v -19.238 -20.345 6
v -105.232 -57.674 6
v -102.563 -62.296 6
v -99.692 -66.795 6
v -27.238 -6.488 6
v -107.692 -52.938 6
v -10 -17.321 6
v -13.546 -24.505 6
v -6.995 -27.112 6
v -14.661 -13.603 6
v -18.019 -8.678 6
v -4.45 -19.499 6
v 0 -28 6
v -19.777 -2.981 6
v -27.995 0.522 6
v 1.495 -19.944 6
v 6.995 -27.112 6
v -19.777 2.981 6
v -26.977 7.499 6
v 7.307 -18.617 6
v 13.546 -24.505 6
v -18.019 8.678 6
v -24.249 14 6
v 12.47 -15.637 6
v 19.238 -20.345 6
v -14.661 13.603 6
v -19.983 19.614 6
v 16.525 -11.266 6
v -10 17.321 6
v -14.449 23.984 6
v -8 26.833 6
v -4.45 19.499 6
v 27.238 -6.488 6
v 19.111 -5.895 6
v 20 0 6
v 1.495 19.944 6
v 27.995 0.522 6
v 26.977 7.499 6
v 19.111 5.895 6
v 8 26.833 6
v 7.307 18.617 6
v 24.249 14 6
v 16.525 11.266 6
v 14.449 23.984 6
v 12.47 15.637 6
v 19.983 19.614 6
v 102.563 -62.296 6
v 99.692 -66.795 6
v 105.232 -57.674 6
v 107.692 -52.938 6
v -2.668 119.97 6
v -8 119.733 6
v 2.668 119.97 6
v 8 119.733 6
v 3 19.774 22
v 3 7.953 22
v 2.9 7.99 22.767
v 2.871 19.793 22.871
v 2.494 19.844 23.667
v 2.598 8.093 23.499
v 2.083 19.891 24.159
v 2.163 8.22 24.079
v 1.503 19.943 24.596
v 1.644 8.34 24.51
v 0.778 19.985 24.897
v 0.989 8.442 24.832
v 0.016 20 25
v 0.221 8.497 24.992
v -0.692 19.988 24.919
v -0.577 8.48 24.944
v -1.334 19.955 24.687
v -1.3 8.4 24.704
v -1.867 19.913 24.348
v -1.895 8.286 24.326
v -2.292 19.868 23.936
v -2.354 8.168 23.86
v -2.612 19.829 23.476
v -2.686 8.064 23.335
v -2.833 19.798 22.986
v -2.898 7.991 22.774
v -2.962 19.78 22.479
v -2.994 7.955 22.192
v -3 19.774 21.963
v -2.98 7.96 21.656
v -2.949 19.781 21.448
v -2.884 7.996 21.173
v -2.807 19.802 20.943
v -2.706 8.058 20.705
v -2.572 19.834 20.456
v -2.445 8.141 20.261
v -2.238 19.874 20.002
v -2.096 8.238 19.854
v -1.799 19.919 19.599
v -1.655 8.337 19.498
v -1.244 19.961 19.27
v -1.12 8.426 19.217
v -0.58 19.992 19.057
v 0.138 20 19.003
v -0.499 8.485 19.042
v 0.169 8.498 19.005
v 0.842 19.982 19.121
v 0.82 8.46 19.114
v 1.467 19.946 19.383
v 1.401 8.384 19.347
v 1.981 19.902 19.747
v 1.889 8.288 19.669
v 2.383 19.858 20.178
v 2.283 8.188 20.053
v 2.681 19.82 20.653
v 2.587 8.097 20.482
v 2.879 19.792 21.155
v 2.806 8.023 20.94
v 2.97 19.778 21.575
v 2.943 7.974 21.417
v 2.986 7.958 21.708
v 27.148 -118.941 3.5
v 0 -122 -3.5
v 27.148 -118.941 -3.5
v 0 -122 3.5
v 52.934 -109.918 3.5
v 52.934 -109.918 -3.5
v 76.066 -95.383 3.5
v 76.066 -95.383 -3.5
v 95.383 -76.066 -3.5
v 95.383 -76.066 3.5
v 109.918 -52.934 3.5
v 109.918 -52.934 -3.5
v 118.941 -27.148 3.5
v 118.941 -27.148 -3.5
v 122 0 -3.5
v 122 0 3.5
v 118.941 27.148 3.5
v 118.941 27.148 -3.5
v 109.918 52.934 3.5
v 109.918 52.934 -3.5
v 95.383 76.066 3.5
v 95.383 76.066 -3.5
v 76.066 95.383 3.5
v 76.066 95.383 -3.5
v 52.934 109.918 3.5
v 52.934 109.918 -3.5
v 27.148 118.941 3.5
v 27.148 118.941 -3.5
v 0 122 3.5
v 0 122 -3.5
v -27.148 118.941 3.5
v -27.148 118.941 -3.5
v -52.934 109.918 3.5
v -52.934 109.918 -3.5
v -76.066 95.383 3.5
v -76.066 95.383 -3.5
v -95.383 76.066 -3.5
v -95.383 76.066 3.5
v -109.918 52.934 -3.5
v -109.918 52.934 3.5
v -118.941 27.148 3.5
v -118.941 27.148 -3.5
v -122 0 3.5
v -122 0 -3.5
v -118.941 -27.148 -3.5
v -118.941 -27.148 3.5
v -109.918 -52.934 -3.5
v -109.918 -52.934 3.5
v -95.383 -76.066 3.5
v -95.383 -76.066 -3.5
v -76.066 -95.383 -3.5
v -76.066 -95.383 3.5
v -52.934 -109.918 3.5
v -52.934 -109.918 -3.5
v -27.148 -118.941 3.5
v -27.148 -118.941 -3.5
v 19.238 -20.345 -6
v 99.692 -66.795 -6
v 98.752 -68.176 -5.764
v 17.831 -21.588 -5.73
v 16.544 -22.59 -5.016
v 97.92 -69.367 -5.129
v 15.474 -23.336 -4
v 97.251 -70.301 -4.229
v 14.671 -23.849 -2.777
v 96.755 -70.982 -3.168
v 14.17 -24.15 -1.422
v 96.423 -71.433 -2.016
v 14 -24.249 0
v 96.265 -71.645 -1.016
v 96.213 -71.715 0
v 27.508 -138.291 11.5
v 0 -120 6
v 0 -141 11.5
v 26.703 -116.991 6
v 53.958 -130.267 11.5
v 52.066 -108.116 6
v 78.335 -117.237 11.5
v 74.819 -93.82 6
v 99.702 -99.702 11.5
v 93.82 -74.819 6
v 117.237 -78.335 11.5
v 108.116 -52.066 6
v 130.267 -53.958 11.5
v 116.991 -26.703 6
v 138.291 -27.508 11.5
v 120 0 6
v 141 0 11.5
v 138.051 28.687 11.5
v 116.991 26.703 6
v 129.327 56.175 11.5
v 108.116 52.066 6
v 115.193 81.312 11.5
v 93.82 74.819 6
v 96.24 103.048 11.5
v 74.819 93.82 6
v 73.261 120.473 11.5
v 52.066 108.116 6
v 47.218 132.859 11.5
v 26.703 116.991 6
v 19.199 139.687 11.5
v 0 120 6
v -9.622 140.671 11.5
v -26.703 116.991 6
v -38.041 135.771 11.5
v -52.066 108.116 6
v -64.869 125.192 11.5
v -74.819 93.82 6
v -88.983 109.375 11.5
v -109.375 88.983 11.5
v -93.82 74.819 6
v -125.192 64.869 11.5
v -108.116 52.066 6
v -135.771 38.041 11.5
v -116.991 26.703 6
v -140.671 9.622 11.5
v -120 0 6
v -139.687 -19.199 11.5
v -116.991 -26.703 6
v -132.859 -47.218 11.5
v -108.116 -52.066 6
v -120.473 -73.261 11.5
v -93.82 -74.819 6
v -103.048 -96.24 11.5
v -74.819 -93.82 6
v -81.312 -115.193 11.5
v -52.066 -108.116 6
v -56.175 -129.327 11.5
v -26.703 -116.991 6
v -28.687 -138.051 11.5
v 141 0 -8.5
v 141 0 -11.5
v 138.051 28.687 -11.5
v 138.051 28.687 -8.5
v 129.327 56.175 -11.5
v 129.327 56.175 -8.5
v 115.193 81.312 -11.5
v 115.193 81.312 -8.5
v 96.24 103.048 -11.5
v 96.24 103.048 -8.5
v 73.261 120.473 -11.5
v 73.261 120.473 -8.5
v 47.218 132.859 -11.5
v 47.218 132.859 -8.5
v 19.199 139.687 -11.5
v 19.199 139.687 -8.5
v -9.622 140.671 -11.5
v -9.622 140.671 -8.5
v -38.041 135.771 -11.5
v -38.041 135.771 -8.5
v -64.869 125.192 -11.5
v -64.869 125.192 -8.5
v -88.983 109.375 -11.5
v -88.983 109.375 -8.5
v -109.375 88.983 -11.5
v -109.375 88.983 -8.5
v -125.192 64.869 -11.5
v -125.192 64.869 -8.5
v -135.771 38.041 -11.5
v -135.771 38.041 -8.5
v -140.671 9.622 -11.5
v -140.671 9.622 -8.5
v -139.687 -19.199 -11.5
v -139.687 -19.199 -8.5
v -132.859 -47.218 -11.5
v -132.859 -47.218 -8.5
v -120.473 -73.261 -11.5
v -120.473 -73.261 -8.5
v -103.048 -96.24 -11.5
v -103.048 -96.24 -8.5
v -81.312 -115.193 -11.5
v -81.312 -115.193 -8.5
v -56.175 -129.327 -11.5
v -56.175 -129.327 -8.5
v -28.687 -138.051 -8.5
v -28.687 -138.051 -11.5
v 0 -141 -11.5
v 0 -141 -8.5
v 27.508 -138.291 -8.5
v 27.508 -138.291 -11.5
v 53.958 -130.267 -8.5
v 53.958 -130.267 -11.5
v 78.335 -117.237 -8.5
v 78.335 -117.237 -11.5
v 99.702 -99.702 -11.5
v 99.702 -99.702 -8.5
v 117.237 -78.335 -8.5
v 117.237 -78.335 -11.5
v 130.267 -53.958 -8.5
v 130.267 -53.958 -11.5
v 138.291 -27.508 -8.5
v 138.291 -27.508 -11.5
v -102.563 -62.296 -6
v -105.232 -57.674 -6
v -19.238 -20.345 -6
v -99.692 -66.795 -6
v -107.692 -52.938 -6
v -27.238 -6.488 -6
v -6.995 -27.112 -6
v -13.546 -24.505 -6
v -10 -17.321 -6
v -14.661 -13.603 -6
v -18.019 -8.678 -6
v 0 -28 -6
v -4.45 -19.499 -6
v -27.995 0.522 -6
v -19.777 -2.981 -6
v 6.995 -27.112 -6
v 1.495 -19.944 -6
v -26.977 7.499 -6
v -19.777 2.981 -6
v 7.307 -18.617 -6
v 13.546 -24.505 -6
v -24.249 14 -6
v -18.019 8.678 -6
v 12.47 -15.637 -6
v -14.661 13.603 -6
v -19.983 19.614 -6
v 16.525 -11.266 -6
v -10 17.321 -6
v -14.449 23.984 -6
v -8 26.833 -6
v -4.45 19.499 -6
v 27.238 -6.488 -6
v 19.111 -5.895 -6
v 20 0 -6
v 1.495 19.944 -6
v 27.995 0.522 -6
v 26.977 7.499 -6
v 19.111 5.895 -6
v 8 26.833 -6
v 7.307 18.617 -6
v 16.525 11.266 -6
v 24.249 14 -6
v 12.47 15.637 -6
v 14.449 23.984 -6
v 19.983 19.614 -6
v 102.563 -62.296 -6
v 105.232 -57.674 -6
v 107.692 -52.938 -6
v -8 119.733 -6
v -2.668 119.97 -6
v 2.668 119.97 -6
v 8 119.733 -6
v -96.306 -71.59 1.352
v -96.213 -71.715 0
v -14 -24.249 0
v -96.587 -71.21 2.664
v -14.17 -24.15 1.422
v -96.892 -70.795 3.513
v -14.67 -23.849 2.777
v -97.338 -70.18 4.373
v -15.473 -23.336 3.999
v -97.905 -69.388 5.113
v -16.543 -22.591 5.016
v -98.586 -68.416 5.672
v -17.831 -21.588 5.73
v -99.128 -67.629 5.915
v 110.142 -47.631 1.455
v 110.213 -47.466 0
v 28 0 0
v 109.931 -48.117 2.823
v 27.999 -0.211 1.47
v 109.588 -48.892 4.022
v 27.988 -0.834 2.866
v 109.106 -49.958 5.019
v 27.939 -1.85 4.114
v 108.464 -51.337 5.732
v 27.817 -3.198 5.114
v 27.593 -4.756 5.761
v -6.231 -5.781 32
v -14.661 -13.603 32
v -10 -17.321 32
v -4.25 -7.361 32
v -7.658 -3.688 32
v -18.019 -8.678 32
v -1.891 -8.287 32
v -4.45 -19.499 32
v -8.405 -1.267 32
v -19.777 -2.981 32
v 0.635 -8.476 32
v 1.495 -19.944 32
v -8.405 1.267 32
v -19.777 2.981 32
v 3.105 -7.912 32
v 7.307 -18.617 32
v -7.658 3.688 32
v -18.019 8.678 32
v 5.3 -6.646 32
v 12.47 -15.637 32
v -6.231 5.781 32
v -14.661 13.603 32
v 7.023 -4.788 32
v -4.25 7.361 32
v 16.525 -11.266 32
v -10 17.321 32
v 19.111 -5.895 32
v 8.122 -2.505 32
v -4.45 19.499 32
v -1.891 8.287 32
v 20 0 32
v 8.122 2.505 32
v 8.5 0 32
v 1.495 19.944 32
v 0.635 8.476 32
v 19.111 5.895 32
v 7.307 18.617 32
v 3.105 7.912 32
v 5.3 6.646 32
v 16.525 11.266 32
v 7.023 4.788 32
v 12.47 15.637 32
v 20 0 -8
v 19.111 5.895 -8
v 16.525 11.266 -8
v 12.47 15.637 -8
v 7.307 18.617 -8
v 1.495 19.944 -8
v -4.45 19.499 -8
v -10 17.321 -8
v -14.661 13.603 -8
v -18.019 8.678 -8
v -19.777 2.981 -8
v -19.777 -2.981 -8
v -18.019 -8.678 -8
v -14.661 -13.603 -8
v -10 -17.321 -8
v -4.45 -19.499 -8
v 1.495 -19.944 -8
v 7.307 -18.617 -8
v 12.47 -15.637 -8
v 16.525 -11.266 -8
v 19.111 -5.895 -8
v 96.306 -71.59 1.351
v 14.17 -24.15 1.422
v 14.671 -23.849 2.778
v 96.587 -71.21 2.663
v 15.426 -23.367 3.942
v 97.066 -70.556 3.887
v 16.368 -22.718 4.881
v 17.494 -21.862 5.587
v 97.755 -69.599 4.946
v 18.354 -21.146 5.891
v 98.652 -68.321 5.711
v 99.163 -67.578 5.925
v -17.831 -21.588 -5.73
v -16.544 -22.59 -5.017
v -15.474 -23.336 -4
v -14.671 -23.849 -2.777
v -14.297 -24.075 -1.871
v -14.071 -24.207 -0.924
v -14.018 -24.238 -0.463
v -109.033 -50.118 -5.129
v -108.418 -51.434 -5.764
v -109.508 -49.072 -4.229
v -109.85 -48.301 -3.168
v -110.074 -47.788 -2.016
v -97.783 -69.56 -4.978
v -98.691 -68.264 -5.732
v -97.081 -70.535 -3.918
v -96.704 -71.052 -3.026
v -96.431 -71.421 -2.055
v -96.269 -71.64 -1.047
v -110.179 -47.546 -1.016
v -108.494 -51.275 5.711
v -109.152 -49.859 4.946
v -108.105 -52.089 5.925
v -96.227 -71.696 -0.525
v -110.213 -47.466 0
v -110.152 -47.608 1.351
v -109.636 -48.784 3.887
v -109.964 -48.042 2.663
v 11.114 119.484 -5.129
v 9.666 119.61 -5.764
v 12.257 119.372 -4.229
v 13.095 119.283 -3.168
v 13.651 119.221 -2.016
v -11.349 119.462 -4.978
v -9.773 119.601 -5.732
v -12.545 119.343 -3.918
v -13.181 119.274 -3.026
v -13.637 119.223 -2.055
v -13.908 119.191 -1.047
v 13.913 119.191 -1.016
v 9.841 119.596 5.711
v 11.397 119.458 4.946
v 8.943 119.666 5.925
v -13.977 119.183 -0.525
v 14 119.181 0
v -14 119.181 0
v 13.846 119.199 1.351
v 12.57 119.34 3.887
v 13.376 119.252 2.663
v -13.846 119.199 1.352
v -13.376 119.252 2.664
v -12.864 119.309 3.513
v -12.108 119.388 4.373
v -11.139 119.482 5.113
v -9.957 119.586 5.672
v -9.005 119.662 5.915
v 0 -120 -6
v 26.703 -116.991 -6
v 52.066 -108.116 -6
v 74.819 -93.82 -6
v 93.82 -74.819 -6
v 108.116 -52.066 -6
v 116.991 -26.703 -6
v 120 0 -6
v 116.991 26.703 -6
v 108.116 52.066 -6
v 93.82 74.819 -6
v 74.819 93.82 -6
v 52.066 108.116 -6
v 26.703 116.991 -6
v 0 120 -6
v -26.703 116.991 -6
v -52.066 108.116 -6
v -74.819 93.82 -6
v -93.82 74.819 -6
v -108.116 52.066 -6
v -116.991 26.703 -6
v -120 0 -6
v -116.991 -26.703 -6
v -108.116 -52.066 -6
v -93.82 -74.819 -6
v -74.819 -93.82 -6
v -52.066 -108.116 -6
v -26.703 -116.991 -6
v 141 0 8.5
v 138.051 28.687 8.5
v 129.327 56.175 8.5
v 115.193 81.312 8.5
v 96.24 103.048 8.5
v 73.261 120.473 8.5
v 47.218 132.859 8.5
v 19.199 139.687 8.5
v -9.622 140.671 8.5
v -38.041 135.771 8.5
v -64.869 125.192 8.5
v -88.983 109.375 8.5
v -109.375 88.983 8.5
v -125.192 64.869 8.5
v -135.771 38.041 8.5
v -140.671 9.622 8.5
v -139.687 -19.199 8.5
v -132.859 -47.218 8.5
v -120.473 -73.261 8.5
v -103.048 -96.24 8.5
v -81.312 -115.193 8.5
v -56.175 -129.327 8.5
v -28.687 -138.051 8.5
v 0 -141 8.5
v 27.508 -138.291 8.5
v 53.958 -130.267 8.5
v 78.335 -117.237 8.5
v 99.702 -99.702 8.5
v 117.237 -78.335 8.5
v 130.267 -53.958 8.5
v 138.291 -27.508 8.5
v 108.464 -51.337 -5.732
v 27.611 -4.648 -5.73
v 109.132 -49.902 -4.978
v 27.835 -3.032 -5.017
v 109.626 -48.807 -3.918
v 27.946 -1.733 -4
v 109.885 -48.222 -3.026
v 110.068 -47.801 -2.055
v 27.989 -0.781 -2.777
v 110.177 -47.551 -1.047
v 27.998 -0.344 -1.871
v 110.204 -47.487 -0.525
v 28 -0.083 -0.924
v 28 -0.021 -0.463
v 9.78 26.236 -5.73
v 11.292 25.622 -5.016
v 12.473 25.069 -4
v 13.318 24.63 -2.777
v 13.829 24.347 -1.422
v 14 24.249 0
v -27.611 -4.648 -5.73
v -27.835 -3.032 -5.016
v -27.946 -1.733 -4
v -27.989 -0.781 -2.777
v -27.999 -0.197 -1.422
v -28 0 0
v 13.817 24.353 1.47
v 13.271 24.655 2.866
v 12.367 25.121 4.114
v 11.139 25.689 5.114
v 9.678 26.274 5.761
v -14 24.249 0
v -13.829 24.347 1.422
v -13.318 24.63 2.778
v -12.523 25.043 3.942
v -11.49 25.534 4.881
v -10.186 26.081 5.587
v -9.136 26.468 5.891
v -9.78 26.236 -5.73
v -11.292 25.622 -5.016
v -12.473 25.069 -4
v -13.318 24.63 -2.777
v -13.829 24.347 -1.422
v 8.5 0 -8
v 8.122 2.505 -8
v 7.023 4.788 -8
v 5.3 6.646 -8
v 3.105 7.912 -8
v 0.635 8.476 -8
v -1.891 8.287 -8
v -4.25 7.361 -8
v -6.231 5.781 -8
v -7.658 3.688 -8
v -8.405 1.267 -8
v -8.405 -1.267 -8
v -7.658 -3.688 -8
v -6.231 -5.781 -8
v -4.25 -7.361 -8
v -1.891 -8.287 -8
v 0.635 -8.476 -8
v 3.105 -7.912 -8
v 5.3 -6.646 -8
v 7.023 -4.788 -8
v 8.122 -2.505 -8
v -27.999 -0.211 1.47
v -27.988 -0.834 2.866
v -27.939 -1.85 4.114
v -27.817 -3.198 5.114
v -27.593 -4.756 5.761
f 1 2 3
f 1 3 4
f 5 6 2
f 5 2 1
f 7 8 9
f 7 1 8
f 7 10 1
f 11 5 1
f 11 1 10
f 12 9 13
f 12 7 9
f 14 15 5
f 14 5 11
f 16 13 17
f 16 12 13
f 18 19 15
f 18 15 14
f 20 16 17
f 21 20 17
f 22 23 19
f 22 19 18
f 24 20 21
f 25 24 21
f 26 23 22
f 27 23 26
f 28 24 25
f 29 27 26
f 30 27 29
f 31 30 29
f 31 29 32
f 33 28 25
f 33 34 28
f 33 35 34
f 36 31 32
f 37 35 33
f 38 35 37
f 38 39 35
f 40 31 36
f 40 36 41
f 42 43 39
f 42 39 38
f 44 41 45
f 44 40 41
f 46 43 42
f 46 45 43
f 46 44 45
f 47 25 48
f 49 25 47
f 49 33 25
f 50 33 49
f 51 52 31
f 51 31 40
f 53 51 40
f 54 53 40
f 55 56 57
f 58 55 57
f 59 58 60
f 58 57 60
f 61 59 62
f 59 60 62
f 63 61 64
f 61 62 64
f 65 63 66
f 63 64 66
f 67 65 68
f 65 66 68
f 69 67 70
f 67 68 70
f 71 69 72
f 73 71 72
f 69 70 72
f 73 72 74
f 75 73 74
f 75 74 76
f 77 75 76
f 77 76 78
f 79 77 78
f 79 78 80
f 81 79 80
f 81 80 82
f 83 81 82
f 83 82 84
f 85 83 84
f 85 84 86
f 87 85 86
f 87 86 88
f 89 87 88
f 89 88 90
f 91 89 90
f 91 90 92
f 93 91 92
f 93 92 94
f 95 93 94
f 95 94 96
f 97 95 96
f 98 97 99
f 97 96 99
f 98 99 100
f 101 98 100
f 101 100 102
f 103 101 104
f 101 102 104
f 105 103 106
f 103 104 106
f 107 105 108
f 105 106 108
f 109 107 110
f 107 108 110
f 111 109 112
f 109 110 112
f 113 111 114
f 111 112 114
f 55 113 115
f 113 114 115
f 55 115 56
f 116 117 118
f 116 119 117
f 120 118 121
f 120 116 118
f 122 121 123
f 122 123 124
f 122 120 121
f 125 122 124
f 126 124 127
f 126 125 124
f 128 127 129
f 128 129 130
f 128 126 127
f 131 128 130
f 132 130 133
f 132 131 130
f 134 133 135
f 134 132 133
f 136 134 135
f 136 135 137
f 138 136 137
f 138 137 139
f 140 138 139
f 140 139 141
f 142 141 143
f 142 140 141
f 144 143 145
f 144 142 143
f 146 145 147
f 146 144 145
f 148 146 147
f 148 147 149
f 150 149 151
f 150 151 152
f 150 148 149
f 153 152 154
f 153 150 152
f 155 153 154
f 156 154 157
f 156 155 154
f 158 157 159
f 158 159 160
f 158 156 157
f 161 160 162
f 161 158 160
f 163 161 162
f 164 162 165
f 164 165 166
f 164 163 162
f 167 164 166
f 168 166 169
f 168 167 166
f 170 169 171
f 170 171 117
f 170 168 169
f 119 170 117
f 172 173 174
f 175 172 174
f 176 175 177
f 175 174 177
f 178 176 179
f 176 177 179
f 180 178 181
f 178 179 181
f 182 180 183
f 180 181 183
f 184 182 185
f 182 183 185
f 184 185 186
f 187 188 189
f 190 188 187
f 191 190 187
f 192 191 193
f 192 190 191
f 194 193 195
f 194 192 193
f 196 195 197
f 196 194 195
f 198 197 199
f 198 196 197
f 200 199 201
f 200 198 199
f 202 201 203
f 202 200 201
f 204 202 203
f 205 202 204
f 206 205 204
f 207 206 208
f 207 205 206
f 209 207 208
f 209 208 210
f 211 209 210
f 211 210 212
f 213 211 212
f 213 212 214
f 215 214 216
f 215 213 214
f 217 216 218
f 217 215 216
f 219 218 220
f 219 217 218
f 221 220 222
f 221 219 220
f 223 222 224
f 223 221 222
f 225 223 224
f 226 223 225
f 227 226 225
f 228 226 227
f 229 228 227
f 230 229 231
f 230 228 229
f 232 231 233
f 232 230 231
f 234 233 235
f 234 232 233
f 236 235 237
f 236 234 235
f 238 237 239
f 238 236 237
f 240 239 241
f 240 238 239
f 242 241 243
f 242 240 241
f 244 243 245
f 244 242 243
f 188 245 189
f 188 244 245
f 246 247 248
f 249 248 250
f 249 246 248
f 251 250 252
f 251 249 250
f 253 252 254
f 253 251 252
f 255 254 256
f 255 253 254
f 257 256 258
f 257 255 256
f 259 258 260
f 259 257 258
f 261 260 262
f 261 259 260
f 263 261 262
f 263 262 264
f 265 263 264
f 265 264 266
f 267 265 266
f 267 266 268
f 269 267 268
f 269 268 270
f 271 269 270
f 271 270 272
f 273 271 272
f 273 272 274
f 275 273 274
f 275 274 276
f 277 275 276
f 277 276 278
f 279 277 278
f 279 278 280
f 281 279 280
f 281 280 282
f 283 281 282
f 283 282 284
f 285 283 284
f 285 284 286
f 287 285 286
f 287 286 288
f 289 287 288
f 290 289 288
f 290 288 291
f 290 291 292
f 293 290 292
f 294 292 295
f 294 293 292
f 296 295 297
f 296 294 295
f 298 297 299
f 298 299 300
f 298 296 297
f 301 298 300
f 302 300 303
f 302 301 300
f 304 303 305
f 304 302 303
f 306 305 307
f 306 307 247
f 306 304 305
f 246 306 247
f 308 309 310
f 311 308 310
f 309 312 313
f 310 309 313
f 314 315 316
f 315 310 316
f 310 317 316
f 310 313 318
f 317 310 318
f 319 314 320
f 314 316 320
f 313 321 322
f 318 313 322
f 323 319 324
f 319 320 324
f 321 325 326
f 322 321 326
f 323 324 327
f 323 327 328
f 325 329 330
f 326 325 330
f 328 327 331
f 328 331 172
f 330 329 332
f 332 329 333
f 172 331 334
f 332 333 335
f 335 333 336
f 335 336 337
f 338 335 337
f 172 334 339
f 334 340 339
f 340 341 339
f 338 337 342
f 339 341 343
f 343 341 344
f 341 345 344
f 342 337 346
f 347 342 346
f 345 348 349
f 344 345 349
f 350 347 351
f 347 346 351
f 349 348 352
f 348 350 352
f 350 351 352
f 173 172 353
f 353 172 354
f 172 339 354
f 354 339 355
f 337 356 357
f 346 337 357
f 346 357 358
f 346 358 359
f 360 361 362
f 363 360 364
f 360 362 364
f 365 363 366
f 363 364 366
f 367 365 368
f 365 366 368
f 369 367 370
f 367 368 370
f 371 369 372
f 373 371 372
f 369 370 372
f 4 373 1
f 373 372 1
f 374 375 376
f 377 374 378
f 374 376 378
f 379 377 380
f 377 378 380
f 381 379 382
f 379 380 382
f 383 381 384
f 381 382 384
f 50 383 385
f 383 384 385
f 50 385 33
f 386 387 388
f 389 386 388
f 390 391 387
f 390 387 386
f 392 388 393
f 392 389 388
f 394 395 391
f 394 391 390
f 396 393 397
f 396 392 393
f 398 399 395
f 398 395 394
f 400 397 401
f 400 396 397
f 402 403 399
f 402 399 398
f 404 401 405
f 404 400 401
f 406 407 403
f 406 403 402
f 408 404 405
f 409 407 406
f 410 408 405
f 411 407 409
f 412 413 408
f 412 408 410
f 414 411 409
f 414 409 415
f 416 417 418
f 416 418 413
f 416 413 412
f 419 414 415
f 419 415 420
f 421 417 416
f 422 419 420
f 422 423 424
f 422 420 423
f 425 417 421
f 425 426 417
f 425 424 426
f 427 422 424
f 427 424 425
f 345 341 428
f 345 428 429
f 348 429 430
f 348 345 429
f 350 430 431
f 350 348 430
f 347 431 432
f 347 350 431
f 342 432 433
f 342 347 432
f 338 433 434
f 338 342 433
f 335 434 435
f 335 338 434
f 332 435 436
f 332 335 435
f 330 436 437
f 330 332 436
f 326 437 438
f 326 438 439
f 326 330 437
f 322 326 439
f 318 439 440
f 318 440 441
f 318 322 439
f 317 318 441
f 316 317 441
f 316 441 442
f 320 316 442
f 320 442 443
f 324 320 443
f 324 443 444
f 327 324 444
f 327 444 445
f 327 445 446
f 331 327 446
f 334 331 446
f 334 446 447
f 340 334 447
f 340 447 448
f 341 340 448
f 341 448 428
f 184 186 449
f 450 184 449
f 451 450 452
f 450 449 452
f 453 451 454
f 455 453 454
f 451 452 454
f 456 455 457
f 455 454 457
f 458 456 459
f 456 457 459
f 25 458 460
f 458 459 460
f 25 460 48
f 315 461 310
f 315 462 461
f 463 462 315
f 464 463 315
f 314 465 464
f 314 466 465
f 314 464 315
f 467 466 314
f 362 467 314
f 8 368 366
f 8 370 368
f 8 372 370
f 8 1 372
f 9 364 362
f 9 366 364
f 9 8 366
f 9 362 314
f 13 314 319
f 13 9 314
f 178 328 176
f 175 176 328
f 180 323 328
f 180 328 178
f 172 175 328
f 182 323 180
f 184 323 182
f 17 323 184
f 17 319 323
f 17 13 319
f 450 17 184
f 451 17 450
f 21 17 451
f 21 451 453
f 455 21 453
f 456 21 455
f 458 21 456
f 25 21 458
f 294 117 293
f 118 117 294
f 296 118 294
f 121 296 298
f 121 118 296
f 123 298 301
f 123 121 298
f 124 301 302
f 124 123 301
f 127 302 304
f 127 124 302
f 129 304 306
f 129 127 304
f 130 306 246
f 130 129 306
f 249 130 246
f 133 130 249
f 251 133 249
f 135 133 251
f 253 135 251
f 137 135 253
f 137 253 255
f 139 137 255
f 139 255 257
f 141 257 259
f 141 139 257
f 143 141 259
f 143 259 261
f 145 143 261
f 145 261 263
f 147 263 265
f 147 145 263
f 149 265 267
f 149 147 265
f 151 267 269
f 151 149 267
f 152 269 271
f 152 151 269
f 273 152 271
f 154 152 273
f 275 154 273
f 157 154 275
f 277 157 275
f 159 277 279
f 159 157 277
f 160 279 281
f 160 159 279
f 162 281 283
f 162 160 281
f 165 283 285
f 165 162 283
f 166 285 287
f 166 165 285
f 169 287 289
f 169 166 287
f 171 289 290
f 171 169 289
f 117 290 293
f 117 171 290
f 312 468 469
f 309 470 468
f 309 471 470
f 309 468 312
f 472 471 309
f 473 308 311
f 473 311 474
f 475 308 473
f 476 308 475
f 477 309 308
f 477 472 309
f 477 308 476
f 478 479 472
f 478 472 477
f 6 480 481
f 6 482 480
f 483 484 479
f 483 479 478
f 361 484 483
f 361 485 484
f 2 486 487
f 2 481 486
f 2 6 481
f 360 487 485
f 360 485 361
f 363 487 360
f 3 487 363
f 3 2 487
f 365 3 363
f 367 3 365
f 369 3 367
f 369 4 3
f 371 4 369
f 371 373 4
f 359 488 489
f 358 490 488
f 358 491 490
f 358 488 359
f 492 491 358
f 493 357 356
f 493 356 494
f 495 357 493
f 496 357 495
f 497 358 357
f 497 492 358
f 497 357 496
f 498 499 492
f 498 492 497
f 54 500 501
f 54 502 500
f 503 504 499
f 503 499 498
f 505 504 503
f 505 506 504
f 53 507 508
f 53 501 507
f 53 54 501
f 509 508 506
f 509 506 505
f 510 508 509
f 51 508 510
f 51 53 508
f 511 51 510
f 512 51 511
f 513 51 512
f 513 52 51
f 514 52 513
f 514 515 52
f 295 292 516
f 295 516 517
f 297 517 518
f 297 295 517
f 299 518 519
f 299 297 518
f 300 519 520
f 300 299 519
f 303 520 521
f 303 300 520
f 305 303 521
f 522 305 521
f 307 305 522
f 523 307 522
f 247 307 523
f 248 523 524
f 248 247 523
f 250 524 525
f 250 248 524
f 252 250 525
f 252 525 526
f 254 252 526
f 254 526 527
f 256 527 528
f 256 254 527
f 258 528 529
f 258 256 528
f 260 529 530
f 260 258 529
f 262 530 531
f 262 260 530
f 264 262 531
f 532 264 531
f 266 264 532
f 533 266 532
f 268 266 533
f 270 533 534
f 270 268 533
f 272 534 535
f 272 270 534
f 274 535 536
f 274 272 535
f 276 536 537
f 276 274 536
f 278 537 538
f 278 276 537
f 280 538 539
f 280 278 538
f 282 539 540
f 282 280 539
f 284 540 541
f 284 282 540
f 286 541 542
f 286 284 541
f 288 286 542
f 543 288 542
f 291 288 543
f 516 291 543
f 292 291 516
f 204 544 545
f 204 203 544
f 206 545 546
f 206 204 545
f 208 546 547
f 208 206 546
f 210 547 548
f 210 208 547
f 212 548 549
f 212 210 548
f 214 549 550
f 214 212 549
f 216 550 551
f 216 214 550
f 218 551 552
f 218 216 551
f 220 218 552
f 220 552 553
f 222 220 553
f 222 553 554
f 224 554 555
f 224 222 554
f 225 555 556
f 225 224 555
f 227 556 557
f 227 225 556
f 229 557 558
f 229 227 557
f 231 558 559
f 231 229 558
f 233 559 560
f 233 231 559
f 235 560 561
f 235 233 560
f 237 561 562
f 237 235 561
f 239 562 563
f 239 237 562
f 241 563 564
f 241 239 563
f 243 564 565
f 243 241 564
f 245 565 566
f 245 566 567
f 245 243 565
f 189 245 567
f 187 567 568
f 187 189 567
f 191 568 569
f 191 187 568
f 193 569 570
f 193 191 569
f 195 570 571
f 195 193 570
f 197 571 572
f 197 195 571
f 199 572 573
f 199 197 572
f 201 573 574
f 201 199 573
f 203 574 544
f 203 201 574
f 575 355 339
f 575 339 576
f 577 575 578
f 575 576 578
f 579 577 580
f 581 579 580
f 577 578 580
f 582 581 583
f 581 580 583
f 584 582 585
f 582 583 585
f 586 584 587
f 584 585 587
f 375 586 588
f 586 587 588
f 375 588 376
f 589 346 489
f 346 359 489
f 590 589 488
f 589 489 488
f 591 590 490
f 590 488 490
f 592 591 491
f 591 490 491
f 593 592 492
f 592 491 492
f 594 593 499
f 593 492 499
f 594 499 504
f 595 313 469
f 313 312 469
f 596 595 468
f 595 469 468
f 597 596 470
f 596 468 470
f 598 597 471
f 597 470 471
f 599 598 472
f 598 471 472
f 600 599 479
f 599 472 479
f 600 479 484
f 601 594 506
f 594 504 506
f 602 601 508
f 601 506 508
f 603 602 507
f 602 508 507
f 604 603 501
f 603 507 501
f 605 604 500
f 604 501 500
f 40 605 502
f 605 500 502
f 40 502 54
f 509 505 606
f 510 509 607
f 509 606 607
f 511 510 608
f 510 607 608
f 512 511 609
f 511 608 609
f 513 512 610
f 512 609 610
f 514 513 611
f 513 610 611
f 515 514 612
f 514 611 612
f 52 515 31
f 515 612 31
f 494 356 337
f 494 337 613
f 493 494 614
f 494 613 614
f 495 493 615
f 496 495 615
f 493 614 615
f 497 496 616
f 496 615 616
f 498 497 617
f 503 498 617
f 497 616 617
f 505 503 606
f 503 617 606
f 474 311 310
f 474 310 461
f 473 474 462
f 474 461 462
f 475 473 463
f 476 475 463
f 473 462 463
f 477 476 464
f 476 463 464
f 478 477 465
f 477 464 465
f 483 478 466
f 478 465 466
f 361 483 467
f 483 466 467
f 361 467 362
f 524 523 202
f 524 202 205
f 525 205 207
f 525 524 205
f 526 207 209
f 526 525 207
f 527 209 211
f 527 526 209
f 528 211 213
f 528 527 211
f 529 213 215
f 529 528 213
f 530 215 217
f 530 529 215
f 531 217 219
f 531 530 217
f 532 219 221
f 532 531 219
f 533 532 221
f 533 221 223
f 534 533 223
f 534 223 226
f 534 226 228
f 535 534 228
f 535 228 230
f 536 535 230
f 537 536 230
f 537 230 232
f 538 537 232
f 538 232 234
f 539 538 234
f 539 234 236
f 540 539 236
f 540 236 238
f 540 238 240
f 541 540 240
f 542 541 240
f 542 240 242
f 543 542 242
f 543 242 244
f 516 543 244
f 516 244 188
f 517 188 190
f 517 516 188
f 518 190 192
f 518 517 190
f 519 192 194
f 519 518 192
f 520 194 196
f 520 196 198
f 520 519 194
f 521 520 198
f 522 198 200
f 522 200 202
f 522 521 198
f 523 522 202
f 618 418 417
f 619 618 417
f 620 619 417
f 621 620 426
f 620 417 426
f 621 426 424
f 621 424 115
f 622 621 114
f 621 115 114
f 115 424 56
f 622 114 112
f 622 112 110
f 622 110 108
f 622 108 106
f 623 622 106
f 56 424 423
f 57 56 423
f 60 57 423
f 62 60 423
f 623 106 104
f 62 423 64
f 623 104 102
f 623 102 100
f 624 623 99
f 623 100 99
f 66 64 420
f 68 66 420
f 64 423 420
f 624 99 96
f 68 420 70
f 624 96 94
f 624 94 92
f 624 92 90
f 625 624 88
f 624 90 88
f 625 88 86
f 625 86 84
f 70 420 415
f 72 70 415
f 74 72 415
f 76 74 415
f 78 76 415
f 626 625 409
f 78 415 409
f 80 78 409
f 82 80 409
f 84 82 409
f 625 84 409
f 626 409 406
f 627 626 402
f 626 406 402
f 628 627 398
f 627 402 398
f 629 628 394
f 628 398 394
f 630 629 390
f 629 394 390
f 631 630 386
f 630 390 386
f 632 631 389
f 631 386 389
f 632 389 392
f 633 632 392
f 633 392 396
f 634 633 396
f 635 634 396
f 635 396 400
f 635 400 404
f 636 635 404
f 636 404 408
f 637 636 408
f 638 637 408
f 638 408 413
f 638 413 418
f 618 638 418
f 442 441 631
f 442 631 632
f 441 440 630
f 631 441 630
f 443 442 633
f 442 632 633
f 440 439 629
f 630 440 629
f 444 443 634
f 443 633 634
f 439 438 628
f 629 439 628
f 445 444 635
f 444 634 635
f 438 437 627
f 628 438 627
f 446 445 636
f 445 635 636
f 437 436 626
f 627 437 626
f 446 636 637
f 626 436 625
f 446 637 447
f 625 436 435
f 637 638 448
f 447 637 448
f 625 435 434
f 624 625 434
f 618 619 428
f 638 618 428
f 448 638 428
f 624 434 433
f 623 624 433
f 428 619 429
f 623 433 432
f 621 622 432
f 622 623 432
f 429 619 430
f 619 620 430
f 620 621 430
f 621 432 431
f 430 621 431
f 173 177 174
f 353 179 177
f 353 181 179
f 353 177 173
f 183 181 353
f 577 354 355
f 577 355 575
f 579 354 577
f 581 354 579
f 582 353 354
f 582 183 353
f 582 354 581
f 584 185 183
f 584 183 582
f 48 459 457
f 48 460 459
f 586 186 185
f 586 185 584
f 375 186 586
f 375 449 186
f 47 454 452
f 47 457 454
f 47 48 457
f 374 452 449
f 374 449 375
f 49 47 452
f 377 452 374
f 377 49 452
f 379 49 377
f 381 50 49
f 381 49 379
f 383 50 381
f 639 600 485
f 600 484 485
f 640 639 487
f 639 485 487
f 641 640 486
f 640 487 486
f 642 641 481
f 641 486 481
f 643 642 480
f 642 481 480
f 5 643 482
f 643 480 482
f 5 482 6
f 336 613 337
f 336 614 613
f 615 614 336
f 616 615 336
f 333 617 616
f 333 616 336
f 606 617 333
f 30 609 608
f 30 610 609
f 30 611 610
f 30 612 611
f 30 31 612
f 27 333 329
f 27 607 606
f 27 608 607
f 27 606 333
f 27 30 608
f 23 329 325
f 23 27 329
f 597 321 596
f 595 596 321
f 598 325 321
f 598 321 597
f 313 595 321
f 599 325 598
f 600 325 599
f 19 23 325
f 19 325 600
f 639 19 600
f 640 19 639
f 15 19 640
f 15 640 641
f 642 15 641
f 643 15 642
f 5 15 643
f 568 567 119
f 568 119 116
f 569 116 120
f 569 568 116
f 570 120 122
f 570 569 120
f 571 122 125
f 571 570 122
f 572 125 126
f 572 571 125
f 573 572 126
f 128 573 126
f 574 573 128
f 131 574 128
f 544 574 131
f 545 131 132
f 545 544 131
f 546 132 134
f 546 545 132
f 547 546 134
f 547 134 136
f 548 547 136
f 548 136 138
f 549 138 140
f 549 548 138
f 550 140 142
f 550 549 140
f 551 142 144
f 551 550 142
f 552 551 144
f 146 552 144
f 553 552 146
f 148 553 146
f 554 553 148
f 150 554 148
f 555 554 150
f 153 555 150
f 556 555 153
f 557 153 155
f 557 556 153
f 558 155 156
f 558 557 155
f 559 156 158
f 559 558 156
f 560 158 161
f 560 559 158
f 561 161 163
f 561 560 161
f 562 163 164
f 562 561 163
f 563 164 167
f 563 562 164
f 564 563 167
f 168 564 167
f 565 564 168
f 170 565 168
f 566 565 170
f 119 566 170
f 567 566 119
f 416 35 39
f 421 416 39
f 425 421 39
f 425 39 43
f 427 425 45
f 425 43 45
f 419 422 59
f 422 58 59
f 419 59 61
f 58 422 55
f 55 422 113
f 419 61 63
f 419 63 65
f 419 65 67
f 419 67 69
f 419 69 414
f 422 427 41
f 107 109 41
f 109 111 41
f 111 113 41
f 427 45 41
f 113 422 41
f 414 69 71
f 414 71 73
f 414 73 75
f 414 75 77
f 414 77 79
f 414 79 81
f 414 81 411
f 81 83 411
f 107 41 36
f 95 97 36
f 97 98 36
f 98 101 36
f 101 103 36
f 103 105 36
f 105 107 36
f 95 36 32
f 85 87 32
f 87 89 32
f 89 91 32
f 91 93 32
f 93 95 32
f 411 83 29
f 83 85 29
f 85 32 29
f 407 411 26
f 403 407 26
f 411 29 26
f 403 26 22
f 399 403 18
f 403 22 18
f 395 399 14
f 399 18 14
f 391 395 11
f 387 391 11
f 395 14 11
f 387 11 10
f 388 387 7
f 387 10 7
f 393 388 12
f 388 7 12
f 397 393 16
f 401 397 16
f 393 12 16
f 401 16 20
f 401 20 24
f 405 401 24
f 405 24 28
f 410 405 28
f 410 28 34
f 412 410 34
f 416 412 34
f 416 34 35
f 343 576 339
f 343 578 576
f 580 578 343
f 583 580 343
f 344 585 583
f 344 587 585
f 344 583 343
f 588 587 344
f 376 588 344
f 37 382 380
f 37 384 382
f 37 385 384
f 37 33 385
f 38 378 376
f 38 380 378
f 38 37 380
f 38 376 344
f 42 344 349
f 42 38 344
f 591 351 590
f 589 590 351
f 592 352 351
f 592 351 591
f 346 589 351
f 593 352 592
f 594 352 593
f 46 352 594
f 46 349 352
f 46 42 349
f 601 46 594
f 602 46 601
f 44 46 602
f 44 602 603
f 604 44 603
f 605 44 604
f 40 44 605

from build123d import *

# Parameters (mm, degrees)
F0_R          = 141
F0_R_2        = 120
F1_DEPTH      = 11.5
F7_DEPTH      = 6
F8_R          = 20
F9_DEPTH      = 26
F9_DEPTH_BACK = 14
F10_R         = 8.5
F11_DEPTH     = 43.501
F12_R         = 5.99999
F13_R         = 3
F14_DEPTH     = 141.001


# Not quite as in the source:
# - a fillet or chamfer is up to 0.001 mm smaller than in the source, because OpenCascade refuses the exact size


with BuildPart() as f1:
    # F0 (on Top) → F1 (new body, symmetric)
    with BuildSketch(Plane.XY):
        Circle(F0_R)
        Circle(F0_R_2, mode=Mode.SUBTRACT)
    extrude(amount=F1_DEPTH, both=True)

    # F2 (on Right) → F3 (revolve, cut)
    with BuildSketch(Plane.YZ):
        Polygon((-122, 3.5), (-141, 8.5), (-141, -8.5), (-122, -3.5), align=None)
    revolve(axis=Axis((0, 0, 28.2399164939), (0, 0, 1)), mode=Mode.SUBTRACT)

    # F4 (on Right) → F5 (revolve, cut)
    with BuildSketch(Plane.YZ):
        Polygon((-141, 11.5), (-120, 6), (-120, 11.5), align=None)
        Polygon((-120, -6), (-141, -11.5), (-120, -11.5), align=None)
    revolve(axis=Axis((0, 0, 29.001140967), (0, 0, 1)), mode=Mode.SUBTRACT)


with BuildPart() as f7:
    # F6 (on Top) → F7 (new body, symmetric)
    with BuildSketch(Plane.XY):
        with BuildLine():
            Line((-14, 119.1805353235), (-14, 24.248711306))
            ThreePointArc((-14, 24.248711306), (-24.248711306, 14), (-28, 0))
            Line((-28, 0), (-110.2133712268, -47.4659120088))
            ThreePointArc((-110.2133712268, -47.4659120088), (-103.9230484541, -60), (-96.2133712268, -71.7146233147))
            Line((-96.2133712268, -71.7146233147), (-14, -24.248711306))
            ThreePointArc((-14, -24.248711306), (0, -28), (14, -24.248711306))
            Line((14, -24.248711306), (96.2133712268, -71.7146233147))
            ThreePointArc((96.2133712268, -71.7146233147), (103.9230484541, -60), (110.2133712268, -47.4659120088))
            Line((110.2133712268, -47.4659120088), (28, 0))
            ThreePointArc((28, 0), (24.248711306, 14), (14, 24.248711306))
            Line((14, 24.248711306), (14, 119.1805353235))
            ThreePointArc((14, 119.1805353235), (0, 120), (-14, 119.1805353235))
        make_face()
    extrude(amount=F7_DEPTH, both=True)

    # F8 (on face) → F9 (join, two sides)
    with BuildSketch(Plane.XY.offset(6)) as f9_sk:
        Circle(F8_R)
    extrude(amount=F9_DEPTH)
    extrude(f9_sk.sketch, amount=-F9_DEPTH_BACK)

    # F10 (on face) → F11 (cut, through all)
    with BuildSketch(Plane.XY.offset(32)):
        Circle(F10_R)
    extrude(amount=-F11_DEPTH, mode=Mode.SUBTRACT)

    # F12 (radius 6 in the source; OpenCascade refuses exactly that, so slightly less here)
    f12_edges = [f7.edges().sort_by_distance(p)[0] for p in [
        (-14, 71.714623, 6),
        (-14, 71.714623, -6),
        (14, 71.714623, 6),
        (14, 71.714623, -6),
        (69.106686, -23.732956, -6),
        (69.106686, -23.732956, 6),
        (55.106686, -47.981667, 6),
        (55.106686, -47.981667, -6),
        (-55.106686, -47.981667, 6),
        (-55.106686, -47.981667, -6),
        (-69.106686, -23.732956, 6),
        (-69.106686, -23.732956, -6),
    ]]
    fillet(f12_edges, radius=F12_R)

    # F13 (on Front) → F14 (cut, through all)
    with BuildSketch(Plane.XZ):
        with Locations((0, 22)):
            Circle(F13_R)
    extrude(amount=-F14_DEPTH, mode=Mode.SUBTRACT)


solid = Compound([f1.part, f7.part])
